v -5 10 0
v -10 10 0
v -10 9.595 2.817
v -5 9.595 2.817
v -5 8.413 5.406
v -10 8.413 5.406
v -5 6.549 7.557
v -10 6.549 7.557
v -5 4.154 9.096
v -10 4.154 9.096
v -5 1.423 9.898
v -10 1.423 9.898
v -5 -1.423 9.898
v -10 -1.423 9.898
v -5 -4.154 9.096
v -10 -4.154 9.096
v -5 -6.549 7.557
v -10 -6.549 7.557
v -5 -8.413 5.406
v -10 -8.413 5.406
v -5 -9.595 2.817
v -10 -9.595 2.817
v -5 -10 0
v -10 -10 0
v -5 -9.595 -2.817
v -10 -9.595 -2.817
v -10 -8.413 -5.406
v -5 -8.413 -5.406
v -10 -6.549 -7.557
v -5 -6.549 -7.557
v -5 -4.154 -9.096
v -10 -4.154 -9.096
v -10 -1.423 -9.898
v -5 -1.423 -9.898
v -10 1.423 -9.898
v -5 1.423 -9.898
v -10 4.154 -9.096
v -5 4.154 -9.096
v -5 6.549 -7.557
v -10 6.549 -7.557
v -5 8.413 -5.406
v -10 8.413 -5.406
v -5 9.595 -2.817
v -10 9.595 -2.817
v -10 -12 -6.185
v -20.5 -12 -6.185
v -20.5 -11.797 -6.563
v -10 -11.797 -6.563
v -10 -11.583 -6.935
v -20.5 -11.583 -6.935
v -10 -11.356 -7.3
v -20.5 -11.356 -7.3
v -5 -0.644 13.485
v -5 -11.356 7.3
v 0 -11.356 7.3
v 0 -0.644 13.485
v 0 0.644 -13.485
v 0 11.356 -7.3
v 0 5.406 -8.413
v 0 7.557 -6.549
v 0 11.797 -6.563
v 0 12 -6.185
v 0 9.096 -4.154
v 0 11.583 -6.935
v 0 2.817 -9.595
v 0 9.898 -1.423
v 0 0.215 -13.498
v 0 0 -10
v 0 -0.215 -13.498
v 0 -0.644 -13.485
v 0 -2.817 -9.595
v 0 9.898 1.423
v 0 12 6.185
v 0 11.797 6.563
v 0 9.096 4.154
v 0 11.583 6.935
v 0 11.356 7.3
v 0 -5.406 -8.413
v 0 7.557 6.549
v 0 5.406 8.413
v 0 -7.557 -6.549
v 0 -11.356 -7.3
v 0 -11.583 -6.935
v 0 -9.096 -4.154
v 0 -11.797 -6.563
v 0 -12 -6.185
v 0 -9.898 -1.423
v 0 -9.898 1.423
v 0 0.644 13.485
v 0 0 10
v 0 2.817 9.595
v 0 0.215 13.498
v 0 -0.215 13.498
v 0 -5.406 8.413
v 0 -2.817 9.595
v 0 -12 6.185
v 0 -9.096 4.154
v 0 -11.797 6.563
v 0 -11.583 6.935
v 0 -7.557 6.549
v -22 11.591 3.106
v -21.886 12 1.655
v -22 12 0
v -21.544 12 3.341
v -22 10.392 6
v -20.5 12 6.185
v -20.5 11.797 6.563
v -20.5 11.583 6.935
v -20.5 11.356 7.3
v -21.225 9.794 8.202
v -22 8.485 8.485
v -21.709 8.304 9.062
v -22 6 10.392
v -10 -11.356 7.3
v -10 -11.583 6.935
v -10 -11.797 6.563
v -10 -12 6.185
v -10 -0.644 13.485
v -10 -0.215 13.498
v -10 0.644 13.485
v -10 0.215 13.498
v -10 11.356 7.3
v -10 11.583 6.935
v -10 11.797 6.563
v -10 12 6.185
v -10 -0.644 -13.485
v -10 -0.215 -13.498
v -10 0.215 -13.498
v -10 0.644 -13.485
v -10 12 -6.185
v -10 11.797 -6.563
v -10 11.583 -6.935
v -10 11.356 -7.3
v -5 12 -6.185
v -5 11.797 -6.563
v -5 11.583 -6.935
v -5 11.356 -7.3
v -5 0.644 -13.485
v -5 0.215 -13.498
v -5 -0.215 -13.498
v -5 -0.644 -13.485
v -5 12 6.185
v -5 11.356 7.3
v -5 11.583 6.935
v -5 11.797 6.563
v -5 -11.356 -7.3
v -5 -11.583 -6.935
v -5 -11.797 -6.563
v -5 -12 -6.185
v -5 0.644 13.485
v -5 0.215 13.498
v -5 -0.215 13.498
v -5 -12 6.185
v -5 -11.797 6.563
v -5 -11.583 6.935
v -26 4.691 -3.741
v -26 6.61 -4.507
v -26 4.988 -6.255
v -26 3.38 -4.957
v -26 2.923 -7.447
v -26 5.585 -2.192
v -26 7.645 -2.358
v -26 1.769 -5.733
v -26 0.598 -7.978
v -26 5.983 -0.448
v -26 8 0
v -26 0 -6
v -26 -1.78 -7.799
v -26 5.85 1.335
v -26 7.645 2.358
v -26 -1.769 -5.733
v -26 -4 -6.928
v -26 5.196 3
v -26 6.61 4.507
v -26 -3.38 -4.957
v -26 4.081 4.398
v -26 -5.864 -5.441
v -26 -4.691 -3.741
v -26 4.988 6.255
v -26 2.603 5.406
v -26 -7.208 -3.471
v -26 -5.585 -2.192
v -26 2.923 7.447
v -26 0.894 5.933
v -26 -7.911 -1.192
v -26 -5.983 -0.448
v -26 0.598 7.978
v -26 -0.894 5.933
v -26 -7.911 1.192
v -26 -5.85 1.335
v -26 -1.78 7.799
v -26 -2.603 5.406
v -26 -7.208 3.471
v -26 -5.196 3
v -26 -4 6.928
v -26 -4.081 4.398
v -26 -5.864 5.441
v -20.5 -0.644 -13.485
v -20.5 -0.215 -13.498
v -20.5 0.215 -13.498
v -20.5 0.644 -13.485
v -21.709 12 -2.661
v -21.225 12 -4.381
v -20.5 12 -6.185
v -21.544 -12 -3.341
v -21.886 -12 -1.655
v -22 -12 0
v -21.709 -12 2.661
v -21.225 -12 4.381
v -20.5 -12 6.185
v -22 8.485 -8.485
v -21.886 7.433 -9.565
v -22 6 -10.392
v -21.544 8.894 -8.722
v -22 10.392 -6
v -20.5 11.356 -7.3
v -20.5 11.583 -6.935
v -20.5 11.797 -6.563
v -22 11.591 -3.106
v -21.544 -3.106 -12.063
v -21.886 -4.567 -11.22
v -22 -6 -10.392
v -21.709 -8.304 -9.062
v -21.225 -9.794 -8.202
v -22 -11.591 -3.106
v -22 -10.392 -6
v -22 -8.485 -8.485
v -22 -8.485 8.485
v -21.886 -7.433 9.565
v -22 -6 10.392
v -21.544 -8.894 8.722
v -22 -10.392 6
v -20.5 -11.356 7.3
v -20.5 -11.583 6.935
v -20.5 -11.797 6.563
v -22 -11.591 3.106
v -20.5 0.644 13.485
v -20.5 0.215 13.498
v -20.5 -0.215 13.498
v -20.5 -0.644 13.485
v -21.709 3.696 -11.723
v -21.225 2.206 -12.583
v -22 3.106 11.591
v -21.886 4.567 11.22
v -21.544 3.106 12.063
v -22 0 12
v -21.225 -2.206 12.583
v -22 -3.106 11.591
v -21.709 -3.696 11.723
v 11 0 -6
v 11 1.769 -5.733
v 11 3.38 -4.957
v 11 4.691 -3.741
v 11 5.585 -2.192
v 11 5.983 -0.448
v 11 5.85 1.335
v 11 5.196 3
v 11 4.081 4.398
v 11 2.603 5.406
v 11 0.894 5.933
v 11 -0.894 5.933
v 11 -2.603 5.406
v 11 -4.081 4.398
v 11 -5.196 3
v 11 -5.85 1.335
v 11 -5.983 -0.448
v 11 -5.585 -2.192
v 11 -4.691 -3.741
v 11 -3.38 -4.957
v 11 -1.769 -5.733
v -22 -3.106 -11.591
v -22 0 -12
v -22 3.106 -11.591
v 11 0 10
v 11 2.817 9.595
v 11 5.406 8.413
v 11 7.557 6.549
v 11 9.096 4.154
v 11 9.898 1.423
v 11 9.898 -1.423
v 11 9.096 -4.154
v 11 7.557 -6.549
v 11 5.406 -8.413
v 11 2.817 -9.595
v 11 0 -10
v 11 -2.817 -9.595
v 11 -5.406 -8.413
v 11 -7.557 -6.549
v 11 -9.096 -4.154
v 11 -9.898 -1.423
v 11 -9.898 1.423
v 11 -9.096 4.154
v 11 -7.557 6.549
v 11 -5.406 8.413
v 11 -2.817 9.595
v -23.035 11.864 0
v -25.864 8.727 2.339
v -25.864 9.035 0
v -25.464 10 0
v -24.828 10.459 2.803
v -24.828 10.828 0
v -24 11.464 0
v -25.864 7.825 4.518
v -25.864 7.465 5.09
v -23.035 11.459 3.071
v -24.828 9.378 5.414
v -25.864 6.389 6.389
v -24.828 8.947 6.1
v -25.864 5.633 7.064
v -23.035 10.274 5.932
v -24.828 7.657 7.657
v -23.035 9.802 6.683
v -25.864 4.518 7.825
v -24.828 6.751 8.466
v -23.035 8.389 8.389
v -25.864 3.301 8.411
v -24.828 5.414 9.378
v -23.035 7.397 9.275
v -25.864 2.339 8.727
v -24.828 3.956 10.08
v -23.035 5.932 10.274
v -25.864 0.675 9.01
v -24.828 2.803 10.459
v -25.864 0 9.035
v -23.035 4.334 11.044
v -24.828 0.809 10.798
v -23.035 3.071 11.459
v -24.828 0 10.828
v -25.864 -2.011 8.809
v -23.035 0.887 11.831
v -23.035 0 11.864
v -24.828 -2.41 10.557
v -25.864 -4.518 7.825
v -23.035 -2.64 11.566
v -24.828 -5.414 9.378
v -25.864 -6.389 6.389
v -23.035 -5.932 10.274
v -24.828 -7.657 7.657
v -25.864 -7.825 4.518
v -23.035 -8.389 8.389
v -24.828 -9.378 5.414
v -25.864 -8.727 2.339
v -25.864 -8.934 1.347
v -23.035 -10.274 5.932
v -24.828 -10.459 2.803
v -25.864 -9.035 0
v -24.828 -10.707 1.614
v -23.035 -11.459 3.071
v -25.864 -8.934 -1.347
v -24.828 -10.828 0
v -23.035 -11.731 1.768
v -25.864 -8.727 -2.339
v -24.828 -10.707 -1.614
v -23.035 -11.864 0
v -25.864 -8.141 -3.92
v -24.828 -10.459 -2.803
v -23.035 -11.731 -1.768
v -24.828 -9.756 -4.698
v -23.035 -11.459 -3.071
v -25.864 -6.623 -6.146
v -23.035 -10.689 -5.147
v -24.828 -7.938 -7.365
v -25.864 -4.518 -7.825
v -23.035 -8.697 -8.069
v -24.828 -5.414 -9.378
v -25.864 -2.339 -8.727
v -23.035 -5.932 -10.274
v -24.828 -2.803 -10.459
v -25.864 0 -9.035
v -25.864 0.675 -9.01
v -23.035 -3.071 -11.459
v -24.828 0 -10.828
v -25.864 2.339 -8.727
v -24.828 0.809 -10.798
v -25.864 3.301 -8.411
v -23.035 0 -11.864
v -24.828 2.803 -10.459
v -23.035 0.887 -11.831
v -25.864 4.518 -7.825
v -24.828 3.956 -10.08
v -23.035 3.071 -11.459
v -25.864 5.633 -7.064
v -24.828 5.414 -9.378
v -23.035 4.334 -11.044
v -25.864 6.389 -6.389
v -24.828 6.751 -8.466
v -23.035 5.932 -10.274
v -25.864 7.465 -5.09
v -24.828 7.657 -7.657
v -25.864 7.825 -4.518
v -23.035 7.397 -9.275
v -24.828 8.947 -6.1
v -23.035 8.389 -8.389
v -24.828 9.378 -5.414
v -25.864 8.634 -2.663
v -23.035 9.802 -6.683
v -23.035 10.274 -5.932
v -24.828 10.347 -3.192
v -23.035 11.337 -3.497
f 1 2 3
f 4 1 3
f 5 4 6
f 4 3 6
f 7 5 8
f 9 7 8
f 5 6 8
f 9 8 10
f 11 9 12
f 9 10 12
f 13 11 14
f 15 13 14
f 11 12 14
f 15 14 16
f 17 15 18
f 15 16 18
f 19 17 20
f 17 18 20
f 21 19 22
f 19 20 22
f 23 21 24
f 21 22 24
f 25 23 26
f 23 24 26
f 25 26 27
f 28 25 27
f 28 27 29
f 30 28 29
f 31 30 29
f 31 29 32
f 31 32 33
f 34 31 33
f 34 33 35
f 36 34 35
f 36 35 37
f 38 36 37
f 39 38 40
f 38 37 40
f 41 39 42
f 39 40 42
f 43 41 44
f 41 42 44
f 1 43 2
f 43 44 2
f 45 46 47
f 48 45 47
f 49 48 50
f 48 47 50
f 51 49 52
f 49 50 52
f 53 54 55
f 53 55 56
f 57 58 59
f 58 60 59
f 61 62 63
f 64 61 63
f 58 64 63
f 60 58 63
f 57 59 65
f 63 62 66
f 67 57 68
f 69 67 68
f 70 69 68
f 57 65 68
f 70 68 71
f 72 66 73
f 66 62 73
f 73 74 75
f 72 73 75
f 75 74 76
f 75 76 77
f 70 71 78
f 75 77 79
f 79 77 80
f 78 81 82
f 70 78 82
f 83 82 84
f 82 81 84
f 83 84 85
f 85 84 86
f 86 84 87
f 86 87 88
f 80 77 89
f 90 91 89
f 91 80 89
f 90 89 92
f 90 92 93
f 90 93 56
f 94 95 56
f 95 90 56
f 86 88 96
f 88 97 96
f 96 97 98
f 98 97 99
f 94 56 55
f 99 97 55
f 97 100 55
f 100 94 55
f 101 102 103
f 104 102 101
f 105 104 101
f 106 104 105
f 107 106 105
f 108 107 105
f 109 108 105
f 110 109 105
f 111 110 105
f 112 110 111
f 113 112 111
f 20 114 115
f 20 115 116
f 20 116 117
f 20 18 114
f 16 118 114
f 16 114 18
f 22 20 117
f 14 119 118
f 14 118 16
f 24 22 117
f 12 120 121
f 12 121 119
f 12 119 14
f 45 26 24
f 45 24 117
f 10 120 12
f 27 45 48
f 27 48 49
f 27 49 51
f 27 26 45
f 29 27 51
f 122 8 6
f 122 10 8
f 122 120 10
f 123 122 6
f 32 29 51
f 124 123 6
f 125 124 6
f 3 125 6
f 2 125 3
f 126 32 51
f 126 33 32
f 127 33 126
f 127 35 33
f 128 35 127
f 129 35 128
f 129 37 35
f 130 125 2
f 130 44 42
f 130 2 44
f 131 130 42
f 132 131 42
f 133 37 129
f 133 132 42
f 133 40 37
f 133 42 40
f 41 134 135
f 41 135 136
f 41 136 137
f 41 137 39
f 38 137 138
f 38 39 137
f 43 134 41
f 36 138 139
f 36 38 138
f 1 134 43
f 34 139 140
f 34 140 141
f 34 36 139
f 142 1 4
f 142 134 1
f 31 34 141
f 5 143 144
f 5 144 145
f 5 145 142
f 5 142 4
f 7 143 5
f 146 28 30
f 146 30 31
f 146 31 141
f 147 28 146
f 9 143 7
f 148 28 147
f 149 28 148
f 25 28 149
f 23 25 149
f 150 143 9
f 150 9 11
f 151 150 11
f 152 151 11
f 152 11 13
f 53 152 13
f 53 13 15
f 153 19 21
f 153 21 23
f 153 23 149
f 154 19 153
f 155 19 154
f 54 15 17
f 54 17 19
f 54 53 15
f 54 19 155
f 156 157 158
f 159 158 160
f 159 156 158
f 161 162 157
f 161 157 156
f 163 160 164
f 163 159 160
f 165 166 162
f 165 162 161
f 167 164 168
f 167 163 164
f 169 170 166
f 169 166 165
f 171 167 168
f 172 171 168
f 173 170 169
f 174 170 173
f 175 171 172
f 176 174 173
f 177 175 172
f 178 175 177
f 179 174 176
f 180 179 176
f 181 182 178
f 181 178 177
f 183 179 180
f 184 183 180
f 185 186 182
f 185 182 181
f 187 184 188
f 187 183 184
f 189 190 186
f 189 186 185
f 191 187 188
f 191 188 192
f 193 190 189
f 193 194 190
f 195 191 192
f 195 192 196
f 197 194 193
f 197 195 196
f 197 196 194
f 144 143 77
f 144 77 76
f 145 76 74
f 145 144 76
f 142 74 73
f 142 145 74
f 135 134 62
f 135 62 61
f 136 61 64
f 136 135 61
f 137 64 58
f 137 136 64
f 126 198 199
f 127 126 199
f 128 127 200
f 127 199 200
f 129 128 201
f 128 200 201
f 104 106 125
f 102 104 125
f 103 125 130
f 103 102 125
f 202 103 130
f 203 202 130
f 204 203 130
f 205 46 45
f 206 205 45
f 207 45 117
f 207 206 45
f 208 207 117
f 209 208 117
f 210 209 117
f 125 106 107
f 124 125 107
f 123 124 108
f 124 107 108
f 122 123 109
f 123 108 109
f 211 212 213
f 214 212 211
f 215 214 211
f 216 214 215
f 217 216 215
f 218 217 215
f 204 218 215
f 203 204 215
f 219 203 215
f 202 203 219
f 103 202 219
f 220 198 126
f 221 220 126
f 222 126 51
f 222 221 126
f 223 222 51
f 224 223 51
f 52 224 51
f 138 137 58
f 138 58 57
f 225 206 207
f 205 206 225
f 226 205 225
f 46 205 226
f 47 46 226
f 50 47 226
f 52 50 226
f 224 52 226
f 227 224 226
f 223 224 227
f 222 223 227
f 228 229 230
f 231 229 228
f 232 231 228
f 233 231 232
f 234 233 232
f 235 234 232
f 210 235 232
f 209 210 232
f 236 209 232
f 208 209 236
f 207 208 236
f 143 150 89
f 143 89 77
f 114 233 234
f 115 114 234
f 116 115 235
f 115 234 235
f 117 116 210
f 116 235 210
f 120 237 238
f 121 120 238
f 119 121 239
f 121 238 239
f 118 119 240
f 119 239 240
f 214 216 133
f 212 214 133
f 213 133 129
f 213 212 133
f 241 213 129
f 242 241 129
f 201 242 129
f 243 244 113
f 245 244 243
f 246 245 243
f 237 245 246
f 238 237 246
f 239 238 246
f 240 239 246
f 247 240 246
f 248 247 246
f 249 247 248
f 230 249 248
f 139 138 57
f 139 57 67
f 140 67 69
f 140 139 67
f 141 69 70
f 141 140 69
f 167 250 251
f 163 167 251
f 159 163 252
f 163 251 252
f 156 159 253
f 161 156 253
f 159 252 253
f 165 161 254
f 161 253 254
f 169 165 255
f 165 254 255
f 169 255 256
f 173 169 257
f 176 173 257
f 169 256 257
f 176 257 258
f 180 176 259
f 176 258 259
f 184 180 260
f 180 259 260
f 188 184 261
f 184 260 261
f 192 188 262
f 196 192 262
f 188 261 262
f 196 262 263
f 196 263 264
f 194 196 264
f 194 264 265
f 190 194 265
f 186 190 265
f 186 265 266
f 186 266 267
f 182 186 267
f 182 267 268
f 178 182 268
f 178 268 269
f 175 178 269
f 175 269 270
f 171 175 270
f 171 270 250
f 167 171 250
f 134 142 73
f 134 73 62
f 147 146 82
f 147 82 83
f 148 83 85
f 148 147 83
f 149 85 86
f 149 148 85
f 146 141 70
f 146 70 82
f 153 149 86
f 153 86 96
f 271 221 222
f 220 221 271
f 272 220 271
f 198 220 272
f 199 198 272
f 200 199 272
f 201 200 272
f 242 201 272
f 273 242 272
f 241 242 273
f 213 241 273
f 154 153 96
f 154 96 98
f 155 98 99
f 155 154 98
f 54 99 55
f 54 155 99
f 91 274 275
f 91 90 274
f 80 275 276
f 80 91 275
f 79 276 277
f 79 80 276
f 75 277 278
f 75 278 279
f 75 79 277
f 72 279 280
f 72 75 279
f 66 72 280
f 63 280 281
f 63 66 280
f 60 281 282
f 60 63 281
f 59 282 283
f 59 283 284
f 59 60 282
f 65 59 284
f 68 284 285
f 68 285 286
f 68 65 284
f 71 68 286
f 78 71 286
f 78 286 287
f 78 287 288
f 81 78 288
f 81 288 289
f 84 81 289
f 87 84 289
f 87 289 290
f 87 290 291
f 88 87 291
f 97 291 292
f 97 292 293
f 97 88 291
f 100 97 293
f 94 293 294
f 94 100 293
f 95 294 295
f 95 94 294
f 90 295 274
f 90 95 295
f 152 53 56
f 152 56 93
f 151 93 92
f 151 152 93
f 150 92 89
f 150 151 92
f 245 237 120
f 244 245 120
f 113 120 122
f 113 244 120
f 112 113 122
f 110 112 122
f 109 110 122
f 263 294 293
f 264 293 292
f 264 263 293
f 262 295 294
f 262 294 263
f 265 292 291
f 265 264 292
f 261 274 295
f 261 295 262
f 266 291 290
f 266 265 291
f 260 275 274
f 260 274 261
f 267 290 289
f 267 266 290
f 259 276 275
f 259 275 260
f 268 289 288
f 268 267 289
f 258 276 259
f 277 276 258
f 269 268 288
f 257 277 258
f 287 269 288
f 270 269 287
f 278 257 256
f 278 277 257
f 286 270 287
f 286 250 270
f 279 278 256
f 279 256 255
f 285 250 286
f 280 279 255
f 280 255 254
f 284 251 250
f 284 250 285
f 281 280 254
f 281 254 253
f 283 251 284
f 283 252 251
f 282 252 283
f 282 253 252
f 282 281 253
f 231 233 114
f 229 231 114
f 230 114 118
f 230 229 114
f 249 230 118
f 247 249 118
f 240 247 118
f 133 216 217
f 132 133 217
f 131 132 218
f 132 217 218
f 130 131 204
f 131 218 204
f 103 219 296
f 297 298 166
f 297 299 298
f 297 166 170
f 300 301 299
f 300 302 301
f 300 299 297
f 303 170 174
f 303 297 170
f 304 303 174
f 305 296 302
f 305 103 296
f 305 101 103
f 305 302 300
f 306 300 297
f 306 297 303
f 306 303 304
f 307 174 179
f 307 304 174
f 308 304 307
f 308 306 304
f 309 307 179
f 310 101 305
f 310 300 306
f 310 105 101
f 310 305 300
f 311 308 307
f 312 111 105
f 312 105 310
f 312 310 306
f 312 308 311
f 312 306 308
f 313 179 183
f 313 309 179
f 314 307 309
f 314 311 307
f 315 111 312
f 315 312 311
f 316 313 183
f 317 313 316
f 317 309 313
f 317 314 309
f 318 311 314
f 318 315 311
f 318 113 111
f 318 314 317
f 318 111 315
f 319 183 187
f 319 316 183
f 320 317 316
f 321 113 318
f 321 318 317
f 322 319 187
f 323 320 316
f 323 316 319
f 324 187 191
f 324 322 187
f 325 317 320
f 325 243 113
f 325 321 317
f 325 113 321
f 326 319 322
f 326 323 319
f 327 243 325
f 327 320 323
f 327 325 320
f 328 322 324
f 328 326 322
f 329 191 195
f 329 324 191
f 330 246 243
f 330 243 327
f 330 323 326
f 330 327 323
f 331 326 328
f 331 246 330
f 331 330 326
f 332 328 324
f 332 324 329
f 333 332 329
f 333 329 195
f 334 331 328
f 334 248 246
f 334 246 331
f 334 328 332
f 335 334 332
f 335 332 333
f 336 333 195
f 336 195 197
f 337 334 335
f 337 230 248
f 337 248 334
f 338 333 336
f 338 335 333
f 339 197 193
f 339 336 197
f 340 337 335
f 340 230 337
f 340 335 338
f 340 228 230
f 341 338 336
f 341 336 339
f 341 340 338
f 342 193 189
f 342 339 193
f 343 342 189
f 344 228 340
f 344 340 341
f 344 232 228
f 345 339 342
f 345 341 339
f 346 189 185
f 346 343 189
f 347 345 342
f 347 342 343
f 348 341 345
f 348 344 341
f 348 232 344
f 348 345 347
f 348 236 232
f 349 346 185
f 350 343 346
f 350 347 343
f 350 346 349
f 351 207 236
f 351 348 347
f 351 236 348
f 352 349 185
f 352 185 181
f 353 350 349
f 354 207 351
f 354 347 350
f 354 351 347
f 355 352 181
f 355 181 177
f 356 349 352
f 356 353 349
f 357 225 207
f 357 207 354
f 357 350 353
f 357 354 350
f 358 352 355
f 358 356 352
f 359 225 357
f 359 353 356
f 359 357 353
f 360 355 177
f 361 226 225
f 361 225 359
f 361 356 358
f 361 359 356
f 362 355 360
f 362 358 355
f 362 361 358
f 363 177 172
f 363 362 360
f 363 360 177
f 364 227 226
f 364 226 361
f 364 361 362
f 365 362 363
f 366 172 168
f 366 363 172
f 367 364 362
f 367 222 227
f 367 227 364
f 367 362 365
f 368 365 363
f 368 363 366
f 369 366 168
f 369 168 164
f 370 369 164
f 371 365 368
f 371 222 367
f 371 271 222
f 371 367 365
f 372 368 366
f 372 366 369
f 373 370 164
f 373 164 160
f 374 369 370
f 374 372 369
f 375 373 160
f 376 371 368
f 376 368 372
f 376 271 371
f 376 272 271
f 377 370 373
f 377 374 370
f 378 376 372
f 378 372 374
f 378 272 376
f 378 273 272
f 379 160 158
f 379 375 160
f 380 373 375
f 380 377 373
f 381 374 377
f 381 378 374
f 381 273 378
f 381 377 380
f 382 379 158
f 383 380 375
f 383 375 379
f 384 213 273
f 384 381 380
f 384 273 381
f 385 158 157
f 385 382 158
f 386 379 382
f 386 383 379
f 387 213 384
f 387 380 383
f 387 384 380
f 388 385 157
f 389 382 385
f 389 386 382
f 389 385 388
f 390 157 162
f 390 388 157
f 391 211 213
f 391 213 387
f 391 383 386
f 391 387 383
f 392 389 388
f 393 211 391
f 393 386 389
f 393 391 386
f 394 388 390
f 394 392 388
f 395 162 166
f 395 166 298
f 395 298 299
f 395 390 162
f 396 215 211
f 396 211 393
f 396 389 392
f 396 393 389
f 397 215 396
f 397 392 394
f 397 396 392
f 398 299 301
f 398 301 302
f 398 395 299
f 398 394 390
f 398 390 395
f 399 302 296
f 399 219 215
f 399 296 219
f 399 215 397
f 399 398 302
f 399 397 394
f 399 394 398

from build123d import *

# Parameters (mm, degrees)
BOSS_EXTRUDE1_DEPTH        = 10.5
BOSS_EXTRUDE1_2_OUTLINE_W  = 8
BOSS_EXTRUDE1_2_OUTLINE_H  = 5.5
BOSS_EXTRUDE1_START        = -23
BOSS_EXTRUDE1_3_DEPTH      = 2.5
SKETCH2_R                  = 10
BOSS_EXTRUDE2_DEPTH        = 5
BOSS_EXTRUDE3_DEPTH        = 5
SKETCH4_W                  = 11
SKETCH4_H                  = 10
F_12_0_12_DIAMETER_HOLE1_D = 12


with BuildPart() as part:
    # Boss-Extrude1: read off the stored shape, not the designer's step
    # Boss-Extrude1 outline → Boss-Extrude1 (new body)
    with BuildSketch(Plane(origin=(-20.5, 0, 0), x_dir=(0, 0, -1), z_dir=(1, 0, 0))):
        with BuildLine():
            ThreePointArc((-6.184658438, 12), (-6.75, 11.691342951), (-7.299975626, 11.356071321))
            Line((-7.299975626, 11.356071321), (-13.484634065, 0.643928679))
            ThreePointArc((-13.484634065, 0.643928679), (-13.5, 0), (-13.484634065, -0.643928679))
            Line((-13.484634065, -0.643928679), (-7.299975626, -11.356071321))
            ThreePointArc((-7.299975626, -11.356071321), (-6.75, -11.691342951), (-6.184658438, -12))
            Line((-6.184658438, -12), (6.184658438, -12))
            ThreePointArc((6.184658438, -12), (6.75, -11.691342951), (7.299975626, -11.356071321))
            Line((7.299975626, -11.356071321), (13.484634065, -0.643928679))
            ThreePointArc((13.484634065, -0.643928679), (13.5, 0), (13.484634065, 0.643928679))
            Line((13.484634065, 0.643928679), (7.299975626, 11.356071321))
            ThreePointArc((7.299975626, 11.356071321), (6.75, 11.691342951), (6.184658438, 12))
            Line((6.184658438, 12), (-6.184658438, 12))
        make_face()
    extrude(amount=BOSS_EXTRUDE1_DEPTH)

    # Boss-Extrude1 2 outline → Boss-Extrude1 2 (revolve)
    with BuildSketch(Plane.YX):
        with BuildLine():
            ThreePointArc((8, -26), (10.828427125, -24.828427125), (12, -22))
            Line((12, -22), (13.5, -20.5))
            Line((13.5, -20.5), (8, -20.5))
            Line((8, -20.5), (8, -26))
        make_face()
        with Locations((4, -23.25)):
            Rectangle(BOSS_EXTRUDE1_2_OUTLINE_W, BOSS_EXTRUDE1_2_OUTLINE_H)
    revolve(axis=Axis((0, 0, 0), (1, 0, 0)))

    # Boss-Extrude1 3 outline → Boss-Extrude1 3 (cut)
    with BuildSketch(Plane.YZ.offset(BOSS_EXTRUDE1_START)):
        Polygon((0.643928679, 13.484634065), (11.356071321, 7.299975626), (12, 6.92820323), (12, 15), (1.980762112, 15), (0, 13.856406461), align=None)
        Polygon((15, 5.196152422), (12, 6.92820323), (12, -6.92820323), (15, -5.196152422), align=None)
        Polygon((-0.643928679, 13.484634065), (0, 13.856406461), (-1.980762112, 15), (-12, 15), (-12, 6.92820323), (-11.356071321, 7.299975626), align=None)
        Polygon((12, -15), (12, -6.92820323), (11.356071321, -7.299975626), (0.643928679, -13.484634065), (0, -13.856406461), (1.980762112, -15), align=None)
        Polygon((-12, -6.92820323), (-12, 6.92820323), (-15, 5.196152422), (-15, -5.196152422), align=None)
        Polygon((-1.980762112, -15), (0, -13.856406461), (-0.643928679, -13.484634065), (-11.356071321, -7.299975626), (-12, -6.92820323), (-12, -15), align=None)
    extrude(amount=BOSS_EXTRUDE1_3_DEPTH, mode=Mode.SUBTRACT)

    # Sketch2 → Boss-Extrude2 (add)
    with BuildSketch(Plane(origin=(-10, 0, 0), x_dir=(0, 0, -1), z_dir=(1, 0, 0))):
        with Locations(Location((0, 0, 0), (0, 0, 90))):
            Circle(SKETCH2_R)
    extrude(amount=BOSS_EXTRUDE2_DEPTH)

    # Sketch3 → Boss-Extrude3 (add)
    with BuildSketch(Plane(origin=(-5, 0, 0), x_dir=(0, -1, 0), z_dir=(-1, 0, 0))):
        with BuildLine():
            Line((12, -6.184658438), (12, 6.184658438))
            ThreePointArc((12, 6.184658438), (11.691342951, 6.75), (11.356071321, 7.299975626))
            Line((11.356071321, 7.299975626), (0.643928679, 13.484634065))
            ThreePointArc((0.643928679, 13.484634065), (0, 13.5), (-0.643928679, 13.484634065))
            Line((-0.643928679, 13.484634065), (-11.356071321, 7.299975626))
            ThreePointArc((-11.356071321, 7.299975626), (-11.691342951, 6.75), (-12, 6.184658438))
            Line((-12, 6.184658438), (-12, -6.184658438))
            ThreePointArc((-12, -6.184658438), (-11.691342951, -6.75), (-11.356071321, -7.299975626))
            Line((-11.356071321, -7.299975626), (-0.643928679, -13.484634065))
            ThreePointArc((-0.643928679, -13.484634065), (0, -13.5), (0.643928679, -13.484634065))
            Line((0.643928679, -13.484634065), (11.356071321, -7.299975626))
            ThreePointArc((11.356071321, -7.299975626), (11.691342951, -6.75), (12, -6.184658438))
        make_face()
    extrude(amount=-BOSS_EXTRUDE3_DEPTH)

    # Sketch4 → Revolve1 (revolve)
    with BuildSketch(Plane(origin=(0, 0, 0), x_dir=(-1, 0, 0), z_dir=(0, 0, -1)), mode=Mode.PRIVATE) as revolve1_sk:
        with Locations((-5.5, 5)):
            Rectangle(SKETCH4_W, SKETCH4_H)
    revolve(revolve1_sk.sketch.rotate(Axis((11, 0, 0), (-1, 0, 0)), 270), axis=Axis((11, 0, 0), (-1, 0, 0)))

    # Ø12.0 (12) Diameter Hole1 (through all)
    with Locations(Plane.ZY.offset(26)):
        with Locations((0, 0)):
            Hole(F_12_0_12_DIAMETER_HOLE1_D / 2)


solid = part.part
